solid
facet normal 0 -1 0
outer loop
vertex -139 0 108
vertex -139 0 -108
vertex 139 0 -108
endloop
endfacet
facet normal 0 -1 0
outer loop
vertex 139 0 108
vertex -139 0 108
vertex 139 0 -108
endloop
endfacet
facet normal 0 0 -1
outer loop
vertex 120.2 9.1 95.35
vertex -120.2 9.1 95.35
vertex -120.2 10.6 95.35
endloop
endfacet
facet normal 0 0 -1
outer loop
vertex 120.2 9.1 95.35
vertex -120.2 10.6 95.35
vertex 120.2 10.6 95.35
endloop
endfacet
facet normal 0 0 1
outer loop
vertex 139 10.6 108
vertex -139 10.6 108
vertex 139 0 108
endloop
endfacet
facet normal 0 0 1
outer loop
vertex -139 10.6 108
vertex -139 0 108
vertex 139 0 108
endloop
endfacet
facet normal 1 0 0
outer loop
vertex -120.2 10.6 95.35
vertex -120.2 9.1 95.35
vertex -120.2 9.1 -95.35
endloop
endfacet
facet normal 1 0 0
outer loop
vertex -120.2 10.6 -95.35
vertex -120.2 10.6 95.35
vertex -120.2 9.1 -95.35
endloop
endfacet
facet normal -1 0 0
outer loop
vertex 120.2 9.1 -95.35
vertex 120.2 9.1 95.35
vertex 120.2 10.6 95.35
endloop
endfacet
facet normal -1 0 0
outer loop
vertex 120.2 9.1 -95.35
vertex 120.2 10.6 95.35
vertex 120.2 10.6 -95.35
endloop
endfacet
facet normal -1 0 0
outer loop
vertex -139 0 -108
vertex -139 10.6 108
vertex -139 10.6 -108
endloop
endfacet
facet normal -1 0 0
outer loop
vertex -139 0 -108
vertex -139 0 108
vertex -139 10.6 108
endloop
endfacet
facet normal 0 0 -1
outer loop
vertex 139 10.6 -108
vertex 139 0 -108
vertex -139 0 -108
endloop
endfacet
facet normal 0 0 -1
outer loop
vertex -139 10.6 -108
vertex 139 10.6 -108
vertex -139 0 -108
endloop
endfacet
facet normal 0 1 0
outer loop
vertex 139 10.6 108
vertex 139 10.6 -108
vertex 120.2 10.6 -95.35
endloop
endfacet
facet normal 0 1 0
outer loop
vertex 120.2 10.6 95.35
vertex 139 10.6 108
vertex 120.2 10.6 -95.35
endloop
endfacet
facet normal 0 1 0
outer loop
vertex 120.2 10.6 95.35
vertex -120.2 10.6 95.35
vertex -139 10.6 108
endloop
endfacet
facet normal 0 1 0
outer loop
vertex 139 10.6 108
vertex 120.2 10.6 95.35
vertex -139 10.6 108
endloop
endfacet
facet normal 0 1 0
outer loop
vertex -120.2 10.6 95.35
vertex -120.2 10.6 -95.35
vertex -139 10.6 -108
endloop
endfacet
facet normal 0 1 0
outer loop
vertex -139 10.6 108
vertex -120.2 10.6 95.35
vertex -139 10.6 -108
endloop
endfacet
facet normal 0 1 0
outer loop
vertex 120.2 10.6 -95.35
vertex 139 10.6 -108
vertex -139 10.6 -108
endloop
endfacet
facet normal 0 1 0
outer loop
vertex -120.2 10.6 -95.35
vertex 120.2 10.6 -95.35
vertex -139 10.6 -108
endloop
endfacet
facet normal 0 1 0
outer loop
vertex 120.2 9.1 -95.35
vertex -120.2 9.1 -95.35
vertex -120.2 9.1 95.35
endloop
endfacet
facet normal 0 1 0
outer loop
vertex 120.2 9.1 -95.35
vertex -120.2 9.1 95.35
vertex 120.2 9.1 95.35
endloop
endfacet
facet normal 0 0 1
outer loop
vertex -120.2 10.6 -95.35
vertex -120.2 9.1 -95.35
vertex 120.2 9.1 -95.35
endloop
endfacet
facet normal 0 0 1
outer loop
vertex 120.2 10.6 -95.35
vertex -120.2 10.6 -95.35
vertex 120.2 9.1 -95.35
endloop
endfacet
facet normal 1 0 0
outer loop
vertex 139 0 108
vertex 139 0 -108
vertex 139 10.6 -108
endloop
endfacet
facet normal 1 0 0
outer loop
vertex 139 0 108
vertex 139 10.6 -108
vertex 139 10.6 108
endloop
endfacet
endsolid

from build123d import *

# Parameters (mm, degrees)
ESBO_O1_W                = 278
ESBO_O1_H                = 216
RESSALTO_EXTRUS_O1_DEPTH = 9.1
ESBO_O2_W                = 240.4
ESBO_O2_H                = 190.7
RESSALTO_EXTRUS_O2_DEPTH = 1.5


with BuildPart() as part:
    # Esboço1 → Ressalto-extrusão1 (new body)
    with BuildSketch(Plane(origin=(0, 0, 0), x_dir=(1, 0, 0), z_dir=(0, 1, 0))):
        Rectangle(ESBO_O1_W, ESBO_O1_H)
    extrude(amount=RESSALTO_EXTRUS_O1_DEPTH)

    # Esboço2 → Ressalto-extrusão2 (add)
    with BuildSketch(Plane(origin=(0, 9.1, 0), x_dir=(1, 0, 0), z_dir=(0, 1, 0))):
        Polygon((-139, 108), (-120.2, 108), (120.2, 108), (139, 108), (139, -108), (120.2, -108), (-120.2, -108), (-139, -108), align=None)
        Rectangle(ESBO_O2_W, ESBO_O2_H, mode=Mode.SUBTRACT)
    extrude(amount=RESSALTO_EXTRUS_O2_DEPTH)


solid = part.part
